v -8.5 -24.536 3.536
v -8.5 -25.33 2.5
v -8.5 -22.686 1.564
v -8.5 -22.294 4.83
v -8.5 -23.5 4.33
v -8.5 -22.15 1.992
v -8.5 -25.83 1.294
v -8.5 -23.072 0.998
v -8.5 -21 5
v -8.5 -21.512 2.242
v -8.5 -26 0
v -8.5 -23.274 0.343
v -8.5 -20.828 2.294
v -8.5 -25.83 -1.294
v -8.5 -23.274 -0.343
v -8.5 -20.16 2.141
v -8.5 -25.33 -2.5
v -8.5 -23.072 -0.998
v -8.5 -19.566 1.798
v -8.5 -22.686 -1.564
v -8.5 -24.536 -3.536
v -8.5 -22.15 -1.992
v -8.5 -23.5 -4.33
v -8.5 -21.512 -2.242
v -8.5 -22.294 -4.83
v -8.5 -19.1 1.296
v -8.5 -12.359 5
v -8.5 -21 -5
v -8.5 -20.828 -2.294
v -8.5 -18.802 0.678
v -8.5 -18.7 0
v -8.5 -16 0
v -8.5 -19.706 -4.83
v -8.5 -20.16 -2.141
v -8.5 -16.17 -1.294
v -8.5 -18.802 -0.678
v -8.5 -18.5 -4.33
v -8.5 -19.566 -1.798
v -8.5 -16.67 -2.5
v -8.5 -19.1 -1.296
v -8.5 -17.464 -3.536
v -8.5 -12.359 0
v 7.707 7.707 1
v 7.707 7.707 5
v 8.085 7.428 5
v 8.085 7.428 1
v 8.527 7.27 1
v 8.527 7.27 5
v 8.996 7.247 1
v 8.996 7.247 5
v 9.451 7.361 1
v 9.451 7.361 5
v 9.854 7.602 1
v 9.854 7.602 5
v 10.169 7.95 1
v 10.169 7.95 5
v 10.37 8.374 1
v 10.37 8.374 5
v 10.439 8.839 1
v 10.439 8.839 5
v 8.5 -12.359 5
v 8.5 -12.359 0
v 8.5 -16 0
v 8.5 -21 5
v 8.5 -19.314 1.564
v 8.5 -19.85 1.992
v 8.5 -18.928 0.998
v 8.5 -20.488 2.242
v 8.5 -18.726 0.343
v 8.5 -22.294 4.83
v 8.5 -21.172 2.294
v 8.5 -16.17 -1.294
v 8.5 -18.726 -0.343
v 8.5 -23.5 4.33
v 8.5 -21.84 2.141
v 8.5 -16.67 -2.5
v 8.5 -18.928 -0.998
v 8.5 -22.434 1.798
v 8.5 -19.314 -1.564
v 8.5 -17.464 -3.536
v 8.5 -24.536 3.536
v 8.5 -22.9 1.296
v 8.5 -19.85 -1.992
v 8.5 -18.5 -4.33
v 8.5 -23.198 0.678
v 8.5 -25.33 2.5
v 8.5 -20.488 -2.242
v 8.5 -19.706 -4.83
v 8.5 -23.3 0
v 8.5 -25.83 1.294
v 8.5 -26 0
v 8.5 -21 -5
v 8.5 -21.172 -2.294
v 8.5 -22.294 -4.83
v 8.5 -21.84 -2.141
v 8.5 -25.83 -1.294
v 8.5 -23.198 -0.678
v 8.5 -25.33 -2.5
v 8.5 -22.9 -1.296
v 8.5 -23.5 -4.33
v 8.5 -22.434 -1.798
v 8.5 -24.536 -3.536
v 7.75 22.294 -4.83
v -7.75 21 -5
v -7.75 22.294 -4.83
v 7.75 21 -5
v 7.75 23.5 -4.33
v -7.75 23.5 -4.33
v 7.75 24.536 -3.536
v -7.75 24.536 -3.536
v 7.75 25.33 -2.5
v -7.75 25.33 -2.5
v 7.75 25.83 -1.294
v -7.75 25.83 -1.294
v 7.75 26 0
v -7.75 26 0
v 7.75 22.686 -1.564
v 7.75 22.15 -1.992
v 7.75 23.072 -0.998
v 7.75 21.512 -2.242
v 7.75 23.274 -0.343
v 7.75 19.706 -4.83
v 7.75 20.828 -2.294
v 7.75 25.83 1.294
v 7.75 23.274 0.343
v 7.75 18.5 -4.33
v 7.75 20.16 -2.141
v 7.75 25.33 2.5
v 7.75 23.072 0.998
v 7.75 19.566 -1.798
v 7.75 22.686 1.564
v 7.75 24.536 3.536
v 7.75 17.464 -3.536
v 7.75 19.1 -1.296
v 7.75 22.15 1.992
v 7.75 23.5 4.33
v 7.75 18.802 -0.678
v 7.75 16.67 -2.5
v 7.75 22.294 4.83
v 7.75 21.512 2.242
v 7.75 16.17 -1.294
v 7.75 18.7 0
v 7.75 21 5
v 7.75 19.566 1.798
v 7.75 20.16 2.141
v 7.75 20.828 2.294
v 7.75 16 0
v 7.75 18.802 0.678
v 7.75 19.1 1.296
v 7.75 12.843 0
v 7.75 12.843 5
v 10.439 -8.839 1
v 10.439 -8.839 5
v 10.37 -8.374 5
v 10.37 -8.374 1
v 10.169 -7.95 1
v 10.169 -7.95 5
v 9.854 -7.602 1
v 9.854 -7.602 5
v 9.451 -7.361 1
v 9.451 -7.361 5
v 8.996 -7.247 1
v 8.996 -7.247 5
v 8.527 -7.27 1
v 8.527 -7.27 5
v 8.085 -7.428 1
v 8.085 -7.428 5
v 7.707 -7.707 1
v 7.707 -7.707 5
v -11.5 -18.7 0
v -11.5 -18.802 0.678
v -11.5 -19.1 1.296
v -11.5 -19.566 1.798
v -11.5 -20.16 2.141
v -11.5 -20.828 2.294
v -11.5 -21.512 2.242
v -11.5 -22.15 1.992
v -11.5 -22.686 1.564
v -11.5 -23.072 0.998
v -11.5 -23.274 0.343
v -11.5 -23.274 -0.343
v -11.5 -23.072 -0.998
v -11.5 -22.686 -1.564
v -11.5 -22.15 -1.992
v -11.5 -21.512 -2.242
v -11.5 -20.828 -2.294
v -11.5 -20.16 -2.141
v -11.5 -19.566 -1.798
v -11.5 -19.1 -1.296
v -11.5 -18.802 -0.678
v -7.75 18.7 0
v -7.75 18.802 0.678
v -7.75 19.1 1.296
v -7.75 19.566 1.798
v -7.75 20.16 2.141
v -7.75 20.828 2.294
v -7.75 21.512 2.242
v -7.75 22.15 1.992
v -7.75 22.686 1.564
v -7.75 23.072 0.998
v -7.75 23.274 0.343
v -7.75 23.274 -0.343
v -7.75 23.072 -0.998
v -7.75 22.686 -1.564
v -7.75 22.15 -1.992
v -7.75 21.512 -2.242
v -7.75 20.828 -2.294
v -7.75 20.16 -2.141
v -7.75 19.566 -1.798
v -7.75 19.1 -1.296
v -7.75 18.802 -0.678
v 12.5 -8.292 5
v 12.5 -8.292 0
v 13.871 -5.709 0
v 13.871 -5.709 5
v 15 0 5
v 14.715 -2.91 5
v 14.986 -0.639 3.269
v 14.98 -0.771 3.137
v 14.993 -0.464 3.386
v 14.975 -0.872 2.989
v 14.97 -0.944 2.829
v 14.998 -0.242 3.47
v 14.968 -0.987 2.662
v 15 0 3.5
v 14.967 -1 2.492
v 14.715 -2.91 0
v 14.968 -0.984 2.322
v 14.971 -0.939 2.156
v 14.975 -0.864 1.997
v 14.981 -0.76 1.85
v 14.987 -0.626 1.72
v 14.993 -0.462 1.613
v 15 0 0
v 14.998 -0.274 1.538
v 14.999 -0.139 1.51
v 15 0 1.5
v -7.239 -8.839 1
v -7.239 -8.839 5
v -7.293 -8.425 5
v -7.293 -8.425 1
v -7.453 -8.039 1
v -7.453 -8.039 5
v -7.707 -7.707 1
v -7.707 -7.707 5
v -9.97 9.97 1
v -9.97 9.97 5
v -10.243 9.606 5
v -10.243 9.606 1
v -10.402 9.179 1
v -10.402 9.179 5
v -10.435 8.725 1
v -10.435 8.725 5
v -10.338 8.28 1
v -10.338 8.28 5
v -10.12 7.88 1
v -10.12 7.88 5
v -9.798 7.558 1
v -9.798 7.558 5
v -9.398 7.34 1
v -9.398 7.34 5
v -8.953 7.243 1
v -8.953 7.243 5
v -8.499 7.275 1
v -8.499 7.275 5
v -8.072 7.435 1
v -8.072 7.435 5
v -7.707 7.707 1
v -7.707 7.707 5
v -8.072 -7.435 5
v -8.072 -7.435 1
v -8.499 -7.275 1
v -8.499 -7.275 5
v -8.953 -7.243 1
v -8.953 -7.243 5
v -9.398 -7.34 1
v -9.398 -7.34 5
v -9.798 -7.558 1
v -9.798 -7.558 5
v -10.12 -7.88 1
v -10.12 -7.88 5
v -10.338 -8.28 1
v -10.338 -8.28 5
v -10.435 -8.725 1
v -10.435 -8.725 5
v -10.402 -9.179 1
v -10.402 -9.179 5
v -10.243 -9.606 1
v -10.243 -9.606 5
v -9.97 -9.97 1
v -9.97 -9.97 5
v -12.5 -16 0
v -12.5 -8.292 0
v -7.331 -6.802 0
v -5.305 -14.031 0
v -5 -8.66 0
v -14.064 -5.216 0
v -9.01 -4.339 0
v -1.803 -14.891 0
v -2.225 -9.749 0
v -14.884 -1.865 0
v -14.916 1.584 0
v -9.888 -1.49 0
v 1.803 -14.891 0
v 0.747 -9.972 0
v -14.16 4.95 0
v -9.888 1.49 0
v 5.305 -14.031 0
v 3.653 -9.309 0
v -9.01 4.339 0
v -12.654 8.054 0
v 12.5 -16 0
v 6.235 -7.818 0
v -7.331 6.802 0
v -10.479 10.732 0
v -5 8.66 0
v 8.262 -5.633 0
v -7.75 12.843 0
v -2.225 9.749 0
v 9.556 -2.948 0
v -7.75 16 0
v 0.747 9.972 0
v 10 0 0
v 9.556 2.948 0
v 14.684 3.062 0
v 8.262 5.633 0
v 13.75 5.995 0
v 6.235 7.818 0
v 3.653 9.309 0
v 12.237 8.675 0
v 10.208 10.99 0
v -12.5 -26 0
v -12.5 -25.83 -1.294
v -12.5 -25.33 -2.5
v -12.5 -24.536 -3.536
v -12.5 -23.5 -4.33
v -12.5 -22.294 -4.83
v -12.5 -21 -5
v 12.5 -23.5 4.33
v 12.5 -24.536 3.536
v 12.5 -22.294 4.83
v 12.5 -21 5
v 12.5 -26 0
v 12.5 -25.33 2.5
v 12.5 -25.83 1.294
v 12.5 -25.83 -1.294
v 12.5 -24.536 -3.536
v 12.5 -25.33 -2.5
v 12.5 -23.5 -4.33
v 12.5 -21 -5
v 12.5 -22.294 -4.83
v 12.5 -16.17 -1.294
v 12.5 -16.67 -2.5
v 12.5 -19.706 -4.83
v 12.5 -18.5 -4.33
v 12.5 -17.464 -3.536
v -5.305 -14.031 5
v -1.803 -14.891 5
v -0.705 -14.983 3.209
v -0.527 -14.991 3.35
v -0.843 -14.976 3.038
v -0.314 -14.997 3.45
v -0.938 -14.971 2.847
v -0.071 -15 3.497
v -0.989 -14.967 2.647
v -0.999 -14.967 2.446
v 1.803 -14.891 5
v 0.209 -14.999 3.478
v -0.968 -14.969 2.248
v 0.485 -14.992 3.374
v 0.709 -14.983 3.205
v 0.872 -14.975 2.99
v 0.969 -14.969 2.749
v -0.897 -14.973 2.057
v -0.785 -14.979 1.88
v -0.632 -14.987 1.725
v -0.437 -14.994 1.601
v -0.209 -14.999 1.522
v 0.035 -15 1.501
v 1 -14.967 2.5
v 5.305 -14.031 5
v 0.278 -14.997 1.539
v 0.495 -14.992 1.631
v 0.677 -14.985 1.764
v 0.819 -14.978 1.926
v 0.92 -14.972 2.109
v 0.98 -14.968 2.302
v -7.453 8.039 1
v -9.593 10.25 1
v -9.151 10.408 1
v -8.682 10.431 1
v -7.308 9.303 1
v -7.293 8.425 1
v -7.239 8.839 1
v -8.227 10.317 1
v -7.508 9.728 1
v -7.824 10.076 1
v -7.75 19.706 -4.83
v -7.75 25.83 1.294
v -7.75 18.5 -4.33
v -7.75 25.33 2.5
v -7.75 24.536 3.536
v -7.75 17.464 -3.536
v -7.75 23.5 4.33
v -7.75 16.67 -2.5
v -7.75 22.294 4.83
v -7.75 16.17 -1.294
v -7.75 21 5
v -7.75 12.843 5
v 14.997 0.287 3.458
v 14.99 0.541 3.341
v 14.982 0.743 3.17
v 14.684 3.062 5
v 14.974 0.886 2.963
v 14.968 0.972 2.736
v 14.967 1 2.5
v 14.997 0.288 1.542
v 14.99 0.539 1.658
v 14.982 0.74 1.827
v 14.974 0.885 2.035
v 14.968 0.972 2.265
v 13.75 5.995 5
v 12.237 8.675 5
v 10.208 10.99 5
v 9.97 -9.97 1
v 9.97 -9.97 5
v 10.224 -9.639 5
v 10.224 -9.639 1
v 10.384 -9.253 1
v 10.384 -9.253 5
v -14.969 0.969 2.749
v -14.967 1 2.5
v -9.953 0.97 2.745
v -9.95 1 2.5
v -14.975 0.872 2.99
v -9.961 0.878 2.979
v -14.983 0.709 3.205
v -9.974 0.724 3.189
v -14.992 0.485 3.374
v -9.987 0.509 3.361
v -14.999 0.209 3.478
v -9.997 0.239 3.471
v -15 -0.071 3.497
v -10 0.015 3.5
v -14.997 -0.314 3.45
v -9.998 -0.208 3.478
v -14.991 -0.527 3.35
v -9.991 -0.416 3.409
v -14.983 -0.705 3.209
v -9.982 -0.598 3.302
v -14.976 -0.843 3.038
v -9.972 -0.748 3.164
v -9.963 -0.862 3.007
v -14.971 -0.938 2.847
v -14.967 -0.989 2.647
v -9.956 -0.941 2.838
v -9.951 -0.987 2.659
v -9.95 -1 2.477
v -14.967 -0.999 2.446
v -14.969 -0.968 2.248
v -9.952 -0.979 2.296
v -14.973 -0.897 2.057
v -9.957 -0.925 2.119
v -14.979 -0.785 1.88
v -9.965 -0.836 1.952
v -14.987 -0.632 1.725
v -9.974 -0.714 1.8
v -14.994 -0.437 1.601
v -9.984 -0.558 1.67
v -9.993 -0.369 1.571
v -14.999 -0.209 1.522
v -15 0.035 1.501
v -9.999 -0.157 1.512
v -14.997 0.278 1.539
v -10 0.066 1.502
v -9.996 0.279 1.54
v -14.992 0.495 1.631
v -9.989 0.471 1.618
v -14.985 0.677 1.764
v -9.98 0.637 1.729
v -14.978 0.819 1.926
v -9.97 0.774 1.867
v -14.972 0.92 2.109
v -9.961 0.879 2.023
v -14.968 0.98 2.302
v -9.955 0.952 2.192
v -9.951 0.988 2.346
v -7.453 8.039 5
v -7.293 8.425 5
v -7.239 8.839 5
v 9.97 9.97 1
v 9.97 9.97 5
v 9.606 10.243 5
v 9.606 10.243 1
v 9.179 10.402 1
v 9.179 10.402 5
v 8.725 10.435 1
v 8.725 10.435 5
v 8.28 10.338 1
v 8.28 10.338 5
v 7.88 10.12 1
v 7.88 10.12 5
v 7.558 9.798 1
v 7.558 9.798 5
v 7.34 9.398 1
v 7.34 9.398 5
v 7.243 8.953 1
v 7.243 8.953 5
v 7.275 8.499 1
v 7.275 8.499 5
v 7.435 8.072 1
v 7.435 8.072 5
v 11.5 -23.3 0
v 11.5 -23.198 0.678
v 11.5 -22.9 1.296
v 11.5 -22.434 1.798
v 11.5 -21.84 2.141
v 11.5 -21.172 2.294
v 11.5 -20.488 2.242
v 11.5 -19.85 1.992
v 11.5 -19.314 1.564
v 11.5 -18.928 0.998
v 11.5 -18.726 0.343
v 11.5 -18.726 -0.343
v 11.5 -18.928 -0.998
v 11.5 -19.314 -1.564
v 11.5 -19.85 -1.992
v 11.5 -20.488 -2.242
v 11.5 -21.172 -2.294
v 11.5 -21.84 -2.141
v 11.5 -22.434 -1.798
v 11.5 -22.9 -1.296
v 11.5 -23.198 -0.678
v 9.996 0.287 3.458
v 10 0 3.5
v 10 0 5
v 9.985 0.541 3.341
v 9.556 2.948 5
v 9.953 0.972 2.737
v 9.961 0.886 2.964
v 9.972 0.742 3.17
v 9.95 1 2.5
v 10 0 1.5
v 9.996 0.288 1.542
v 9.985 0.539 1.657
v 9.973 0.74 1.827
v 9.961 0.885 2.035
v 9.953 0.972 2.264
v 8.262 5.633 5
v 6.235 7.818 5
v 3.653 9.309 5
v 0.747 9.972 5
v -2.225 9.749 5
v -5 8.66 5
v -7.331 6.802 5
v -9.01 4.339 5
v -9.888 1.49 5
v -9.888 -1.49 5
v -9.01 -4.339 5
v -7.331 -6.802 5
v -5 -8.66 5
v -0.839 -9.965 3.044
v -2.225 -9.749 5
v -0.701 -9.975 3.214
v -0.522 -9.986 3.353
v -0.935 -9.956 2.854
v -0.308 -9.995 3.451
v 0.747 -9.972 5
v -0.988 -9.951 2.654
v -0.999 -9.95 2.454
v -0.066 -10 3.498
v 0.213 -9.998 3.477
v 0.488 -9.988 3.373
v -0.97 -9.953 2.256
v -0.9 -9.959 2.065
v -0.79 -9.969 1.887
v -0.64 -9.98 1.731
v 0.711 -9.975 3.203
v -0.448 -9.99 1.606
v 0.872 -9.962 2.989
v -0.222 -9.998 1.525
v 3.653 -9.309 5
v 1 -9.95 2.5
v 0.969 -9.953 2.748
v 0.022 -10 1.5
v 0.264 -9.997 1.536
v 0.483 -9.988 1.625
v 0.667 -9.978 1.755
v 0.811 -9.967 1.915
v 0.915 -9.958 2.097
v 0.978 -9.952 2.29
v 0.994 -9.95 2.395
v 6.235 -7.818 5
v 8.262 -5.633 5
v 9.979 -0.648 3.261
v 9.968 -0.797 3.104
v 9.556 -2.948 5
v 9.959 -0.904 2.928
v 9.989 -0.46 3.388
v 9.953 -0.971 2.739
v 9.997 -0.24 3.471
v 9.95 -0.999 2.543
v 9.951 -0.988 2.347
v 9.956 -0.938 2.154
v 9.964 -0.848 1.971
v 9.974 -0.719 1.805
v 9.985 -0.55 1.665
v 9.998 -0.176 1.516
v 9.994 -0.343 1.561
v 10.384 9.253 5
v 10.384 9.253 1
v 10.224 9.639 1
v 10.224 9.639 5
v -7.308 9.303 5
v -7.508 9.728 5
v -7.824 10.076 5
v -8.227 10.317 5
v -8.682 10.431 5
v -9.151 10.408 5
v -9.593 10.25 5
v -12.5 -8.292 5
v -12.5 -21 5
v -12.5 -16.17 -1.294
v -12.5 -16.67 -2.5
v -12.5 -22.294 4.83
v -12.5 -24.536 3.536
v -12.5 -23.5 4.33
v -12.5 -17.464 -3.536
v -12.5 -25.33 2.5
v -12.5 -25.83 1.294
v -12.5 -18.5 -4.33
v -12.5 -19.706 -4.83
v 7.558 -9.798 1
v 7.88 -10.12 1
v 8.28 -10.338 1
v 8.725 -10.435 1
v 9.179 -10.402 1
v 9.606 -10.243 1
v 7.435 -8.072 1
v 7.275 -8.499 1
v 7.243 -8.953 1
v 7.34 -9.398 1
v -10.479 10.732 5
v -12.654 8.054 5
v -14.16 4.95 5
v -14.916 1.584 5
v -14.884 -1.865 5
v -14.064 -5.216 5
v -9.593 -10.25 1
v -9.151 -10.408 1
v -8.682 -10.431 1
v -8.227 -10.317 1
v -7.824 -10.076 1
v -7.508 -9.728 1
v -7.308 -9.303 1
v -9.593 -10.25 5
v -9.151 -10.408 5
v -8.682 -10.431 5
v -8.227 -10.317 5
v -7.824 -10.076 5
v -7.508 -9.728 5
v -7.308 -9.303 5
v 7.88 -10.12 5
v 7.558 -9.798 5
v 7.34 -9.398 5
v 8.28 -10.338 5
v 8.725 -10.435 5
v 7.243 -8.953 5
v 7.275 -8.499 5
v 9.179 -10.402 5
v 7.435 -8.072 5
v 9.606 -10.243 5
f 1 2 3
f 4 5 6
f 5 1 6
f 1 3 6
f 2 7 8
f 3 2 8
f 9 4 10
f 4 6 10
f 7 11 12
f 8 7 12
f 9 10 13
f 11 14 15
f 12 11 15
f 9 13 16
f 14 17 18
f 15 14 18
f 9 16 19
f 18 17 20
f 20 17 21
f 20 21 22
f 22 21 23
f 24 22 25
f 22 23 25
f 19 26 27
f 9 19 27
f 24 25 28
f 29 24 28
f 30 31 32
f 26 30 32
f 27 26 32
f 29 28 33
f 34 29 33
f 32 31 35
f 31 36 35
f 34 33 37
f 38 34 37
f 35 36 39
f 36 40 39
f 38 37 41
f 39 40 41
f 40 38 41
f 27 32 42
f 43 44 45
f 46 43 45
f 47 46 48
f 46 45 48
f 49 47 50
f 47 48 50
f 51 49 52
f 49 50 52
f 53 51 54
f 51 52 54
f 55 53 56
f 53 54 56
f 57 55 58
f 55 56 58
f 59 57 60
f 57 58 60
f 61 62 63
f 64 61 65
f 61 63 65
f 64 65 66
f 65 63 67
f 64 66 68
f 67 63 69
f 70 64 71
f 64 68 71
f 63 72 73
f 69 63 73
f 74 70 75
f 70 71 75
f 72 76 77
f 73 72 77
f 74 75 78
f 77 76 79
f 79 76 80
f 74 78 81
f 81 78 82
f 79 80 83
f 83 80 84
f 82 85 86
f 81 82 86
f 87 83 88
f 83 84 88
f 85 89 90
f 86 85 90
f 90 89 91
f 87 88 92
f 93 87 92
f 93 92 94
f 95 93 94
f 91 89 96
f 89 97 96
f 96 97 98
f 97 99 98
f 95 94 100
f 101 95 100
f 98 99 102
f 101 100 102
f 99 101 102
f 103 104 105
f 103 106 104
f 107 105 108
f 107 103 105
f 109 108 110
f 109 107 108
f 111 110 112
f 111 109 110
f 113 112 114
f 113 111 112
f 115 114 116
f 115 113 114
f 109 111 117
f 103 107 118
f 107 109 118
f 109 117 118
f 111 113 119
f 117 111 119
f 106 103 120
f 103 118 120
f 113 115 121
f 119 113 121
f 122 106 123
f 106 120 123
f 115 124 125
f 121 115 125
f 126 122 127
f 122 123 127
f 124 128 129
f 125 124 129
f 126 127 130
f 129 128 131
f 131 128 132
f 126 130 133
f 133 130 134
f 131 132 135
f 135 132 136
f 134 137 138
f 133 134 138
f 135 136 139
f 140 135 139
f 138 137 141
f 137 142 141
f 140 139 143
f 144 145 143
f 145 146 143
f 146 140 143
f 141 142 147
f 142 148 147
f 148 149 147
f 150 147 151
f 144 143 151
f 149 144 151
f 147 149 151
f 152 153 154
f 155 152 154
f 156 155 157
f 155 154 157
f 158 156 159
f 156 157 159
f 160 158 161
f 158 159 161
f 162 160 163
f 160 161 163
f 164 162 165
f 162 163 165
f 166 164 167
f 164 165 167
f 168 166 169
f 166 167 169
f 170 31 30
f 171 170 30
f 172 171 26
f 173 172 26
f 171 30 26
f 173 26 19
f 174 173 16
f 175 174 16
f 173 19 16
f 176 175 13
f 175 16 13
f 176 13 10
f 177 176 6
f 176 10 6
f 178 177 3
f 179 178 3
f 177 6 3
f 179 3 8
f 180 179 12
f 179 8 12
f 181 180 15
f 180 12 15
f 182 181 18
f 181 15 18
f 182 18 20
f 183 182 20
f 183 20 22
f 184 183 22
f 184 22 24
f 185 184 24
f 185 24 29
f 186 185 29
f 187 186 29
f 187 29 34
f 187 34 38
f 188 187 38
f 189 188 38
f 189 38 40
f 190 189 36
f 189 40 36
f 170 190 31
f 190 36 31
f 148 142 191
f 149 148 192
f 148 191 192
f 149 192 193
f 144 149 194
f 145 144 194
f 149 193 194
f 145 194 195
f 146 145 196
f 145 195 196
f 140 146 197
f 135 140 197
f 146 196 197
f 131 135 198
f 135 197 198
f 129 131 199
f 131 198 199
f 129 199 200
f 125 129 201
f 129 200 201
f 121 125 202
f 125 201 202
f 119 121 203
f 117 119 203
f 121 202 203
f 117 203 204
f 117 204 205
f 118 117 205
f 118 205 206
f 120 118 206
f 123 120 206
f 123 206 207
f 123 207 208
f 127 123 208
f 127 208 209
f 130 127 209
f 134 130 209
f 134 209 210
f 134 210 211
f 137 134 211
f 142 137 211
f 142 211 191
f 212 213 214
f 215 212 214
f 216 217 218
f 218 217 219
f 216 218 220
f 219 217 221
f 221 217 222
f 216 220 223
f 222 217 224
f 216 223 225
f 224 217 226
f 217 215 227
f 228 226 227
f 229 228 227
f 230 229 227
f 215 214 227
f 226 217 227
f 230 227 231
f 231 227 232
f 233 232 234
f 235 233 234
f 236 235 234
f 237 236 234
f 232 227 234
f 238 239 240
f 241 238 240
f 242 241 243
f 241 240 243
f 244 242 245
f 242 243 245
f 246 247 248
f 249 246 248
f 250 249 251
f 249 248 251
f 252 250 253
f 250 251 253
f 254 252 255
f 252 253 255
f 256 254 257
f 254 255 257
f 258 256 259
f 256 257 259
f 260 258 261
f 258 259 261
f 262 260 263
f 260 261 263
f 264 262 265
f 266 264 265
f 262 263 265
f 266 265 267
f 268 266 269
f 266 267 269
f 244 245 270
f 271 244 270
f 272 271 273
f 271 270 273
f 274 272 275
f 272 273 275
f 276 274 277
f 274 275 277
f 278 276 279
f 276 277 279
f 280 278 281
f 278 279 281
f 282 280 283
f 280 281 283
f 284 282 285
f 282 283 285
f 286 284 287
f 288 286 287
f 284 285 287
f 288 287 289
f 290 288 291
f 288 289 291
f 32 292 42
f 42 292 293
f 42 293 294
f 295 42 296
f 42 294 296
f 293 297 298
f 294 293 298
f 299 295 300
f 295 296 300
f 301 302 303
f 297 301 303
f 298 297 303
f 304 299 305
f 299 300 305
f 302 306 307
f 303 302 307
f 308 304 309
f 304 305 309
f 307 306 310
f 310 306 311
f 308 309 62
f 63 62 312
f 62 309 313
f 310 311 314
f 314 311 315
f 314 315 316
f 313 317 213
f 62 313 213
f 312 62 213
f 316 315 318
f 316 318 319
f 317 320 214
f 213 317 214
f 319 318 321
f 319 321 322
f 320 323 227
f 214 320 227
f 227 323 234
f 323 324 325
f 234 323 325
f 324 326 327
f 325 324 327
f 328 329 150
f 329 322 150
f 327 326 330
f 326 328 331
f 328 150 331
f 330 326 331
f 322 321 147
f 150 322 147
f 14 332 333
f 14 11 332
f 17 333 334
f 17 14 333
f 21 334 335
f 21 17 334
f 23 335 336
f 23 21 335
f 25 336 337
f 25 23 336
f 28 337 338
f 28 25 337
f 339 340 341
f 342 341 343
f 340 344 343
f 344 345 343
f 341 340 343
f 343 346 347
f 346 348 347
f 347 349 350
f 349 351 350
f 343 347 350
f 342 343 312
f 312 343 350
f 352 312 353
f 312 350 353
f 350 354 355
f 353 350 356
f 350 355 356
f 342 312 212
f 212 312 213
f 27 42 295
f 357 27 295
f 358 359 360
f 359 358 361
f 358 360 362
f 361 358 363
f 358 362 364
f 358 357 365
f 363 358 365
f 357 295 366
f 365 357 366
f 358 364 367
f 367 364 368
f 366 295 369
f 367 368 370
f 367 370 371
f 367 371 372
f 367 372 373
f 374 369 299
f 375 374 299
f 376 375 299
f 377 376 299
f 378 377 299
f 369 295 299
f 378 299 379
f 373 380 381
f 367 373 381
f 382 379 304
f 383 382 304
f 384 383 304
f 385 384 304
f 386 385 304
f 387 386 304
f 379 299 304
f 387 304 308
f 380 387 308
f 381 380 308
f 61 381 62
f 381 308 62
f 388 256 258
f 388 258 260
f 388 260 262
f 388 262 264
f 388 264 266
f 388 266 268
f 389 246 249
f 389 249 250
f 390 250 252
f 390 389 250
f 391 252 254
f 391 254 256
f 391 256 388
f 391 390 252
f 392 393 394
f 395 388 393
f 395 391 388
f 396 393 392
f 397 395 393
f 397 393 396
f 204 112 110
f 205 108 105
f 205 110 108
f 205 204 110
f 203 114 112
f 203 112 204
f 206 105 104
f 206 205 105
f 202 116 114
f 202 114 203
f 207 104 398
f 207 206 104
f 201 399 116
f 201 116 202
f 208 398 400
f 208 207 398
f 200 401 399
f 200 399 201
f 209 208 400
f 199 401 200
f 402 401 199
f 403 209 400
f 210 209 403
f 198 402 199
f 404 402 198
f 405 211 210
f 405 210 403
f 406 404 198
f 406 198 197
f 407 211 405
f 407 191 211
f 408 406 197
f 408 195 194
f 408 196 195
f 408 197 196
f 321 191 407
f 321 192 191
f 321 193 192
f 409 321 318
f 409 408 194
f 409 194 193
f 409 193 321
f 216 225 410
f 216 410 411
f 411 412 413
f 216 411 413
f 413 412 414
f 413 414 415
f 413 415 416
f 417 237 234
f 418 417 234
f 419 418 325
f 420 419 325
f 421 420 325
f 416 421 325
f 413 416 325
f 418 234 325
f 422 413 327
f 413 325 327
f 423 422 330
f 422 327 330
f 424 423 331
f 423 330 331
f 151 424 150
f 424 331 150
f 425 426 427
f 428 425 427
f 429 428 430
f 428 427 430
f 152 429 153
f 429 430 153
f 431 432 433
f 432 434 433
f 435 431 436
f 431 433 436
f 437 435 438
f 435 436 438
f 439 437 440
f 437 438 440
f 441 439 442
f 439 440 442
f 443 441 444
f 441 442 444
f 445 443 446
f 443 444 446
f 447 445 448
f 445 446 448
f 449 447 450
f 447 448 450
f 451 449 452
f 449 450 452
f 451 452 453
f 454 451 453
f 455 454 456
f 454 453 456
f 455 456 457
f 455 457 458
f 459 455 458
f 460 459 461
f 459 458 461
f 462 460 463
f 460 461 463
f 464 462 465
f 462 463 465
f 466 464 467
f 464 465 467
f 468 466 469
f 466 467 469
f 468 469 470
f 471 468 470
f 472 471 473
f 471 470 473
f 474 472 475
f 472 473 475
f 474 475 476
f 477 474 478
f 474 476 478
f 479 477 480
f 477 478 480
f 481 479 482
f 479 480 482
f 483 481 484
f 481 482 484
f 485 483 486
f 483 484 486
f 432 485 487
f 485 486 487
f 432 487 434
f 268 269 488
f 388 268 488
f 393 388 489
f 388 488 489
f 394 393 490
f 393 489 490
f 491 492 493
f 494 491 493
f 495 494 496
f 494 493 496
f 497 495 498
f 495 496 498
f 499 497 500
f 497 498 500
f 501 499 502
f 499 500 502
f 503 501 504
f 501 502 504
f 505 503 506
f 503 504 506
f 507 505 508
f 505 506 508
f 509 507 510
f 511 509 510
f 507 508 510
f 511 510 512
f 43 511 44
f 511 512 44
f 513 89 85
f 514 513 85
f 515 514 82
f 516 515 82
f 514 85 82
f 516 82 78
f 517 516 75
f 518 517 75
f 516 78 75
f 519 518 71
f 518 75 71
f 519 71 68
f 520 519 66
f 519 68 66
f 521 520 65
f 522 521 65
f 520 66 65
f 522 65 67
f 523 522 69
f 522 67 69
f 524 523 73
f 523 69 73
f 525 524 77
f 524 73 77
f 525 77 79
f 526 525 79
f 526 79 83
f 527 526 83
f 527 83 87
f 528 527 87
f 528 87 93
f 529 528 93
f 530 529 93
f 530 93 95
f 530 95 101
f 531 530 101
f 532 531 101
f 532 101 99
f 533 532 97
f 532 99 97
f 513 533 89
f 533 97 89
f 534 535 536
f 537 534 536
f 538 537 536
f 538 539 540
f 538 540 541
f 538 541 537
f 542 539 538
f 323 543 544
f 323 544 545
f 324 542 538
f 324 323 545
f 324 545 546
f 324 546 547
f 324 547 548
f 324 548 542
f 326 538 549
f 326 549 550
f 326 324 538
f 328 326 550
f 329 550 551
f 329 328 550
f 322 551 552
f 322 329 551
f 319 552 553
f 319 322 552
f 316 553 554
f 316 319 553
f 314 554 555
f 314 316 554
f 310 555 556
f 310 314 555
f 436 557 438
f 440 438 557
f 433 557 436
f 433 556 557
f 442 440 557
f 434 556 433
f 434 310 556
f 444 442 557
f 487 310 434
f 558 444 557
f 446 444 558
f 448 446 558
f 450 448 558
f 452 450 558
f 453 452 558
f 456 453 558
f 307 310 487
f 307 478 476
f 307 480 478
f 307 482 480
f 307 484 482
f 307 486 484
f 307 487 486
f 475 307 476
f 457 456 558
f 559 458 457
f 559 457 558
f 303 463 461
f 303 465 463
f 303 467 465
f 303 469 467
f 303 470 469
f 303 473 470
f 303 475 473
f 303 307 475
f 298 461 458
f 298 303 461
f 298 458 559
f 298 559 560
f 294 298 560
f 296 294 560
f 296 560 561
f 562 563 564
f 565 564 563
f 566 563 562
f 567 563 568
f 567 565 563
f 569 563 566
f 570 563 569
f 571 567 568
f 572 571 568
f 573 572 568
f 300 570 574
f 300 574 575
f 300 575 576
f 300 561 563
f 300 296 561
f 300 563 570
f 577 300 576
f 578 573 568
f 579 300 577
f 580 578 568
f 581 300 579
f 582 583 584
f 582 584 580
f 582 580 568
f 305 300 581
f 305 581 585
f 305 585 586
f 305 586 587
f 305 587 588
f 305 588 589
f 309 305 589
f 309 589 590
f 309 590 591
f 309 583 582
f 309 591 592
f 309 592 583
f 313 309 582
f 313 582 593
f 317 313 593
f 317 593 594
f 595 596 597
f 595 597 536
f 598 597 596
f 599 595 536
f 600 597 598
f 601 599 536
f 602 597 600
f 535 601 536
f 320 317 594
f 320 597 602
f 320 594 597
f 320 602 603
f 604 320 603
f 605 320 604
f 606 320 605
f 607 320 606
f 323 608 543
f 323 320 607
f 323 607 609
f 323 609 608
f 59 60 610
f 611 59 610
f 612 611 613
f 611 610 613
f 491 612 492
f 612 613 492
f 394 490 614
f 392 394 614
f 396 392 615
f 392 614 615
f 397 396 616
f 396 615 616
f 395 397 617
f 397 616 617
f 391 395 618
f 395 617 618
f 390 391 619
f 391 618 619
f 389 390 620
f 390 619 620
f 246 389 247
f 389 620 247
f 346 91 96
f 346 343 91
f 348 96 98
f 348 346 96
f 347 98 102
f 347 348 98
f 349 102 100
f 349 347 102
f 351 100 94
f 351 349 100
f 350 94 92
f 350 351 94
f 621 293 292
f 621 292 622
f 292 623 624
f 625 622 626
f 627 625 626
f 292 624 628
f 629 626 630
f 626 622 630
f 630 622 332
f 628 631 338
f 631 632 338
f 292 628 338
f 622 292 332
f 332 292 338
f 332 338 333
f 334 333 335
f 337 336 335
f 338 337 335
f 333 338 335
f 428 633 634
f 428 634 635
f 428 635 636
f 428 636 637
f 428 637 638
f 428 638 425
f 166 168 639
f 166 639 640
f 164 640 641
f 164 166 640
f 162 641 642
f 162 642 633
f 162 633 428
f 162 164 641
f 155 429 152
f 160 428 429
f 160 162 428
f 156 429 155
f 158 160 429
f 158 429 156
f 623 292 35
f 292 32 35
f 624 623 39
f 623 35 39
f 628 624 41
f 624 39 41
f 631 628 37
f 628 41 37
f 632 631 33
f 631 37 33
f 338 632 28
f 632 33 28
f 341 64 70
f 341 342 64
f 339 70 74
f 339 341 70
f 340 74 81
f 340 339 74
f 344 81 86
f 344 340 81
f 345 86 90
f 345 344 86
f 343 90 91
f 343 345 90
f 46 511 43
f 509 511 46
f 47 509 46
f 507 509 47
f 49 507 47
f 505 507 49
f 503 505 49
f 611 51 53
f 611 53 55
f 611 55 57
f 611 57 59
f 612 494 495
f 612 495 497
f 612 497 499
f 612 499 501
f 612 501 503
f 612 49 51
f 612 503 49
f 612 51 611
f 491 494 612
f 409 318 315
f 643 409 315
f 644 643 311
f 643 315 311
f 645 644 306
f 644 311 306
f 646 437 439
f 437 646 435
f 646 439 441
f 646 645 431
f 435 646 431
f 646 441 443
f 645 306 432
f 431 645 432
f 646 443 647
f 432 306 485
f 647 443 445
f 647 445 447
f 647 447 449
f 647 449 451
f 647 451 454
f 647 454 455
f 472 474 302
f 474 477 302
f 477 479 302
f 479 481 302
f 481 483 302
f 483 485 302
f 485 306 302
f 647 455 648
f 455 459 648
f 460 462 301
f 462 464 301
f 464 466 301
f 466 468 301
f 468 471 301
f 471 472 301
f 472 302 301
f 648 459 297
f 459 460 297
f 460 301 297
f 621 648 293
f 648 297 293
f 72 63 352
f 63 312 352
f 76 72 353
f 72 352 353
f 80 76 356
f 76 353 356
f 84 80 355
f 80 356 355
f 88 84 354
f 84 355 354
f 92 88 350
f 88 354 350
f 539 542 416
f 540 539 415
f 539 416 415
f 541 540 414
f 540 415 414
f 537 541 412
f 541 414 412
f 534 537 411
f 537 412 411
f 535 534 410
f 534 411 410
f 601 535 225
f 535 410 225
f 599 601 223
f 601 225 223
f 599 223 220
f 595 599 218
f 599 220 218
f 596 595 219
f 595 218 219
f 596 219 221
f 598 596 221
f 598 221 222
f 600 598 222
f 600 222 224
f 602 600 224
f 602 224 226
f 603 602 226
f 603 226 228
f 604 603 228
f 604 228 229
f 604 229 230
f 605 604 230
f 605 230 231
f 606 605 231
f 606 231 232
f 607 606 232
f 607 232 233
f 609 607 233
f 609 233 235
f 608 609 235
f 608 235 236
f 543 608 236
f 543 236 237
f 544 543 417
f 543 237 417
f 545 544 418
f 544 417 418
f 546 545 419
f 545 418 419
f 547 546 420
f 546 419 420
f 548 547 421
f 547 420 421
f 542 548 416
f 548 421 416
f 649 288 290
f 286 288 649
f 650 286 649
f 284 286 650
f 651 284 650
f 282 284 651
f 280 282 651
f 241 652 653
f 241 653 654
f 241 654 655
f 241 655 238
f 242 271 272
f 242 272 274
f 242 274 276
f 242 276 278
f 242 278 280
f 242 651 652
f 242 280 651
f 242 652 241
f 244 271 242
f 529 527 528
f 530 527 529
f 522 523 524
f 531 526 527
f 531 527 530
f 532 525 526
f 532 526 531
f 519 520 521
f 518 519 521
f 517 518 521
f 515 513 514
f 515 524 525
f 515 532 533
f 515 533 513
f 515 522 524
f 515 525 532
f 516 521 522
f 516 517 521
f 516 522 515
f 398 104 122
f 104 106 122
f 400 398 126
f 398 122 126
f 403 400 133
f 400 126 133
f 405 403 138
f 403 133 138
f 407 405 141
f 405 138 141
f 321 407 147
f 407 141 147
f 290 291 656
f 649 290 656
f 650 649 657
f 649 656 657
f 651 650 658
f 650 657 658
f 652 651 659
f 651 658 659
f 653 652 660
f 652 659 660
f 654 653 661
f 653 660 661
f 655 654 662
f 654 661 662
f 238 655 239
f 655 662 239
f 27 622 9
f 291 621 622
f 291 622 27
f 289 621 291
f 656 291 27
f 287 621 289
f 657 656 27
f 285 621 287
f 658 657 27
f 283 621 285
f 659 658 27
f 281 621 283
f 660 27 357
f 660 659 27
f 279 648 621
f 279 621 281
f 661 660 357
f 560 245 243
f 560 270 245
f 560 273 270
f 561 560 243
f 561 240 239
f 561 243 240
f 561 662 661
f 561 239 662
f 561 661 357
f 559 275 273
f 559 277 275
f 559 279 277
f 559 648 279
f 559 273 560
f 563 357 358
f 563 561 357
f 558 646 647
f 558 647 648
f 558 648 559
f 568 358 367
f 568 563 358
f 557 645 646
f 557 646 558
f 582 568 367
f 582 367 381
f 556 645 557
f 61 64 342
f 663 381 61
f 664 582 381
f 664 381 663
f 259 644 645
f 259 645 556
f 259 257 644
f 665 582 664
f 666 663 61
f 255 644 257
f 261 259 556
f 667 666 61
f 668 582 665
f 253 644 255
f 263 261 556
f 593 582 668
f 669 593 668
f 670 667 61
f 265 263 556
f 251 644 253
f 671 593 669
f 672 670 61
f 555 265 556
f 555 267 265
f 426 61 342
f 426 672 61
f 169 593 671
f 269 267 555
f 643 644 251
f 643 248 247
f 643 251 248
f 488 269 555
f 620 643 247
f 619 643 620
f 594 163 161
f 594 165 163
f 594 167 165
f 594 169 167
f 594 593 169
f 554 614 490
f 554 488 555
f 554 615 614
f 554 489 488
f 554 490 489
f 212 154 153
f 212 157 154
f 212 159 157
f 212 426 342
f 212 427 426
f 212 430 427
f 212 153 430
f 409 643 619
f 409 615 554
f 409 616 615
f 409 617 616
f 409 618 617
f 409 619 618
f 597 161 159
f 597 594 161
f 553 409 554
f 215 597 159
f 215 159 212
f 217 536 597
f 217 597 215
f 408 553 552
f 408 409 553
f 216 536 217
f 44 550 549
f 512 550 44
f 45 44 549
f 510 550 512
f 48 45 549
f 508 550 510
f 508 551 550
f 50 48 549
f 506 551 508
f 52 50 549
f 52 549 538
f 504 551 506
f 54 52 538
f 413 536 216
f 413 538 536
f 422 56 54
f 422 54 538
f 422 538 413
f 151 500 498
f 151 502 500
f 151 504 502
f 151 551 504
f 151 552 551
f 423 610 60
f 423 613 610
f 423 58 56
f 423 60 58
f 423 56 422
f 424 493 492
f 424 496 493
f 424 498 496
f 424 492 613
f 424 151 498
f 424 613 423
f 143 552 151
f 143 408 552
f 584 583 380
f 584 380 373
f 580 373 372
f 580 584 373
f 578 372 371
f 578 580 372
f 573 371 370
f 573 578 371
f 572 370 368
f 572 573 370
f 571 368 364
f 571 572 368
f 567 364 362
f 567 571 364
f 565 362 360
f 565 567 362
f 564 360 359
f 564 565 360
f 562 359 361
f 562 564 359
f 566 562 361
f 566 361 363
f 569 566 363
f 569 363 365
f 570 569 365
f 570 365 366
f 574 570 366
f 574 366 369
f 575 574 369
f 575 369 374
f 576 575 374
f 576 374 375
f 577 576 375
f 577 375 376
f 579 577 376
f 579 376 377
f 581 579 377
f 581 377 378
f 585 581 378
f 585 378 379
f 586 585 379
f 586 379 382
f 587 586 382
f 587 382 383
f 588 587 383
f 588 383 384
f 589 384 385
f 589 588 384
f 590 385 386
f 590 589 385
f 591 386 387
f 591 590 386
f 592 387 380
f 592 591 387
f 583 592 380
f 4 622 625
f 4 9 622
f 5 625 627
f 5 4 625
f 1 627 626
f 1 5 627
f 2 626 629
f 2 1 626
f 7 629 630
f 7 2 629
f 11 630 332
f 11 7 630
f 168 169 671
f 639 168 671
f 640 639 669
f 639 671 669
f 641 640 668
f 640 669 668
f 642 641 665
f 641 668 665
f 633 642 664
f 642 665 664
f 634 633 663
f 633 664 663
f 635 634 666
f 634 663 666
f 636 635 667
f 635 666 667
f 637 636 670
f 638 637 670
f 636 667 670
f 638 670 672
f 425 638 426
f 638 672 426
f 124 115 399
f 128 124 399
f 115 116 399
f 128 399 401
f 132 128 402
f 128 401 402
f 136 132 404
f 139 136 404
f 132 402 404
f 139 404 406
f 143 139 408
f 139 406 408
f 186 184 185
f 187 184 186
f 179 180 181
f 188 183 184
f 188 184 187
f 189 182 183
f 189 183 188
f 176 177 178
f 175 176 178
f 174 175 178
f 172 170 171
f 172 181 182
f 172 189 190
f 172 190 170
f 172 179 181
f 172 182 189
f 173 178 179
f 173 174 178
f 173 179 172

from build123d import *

# Parameters (mm, degrees)
F0_R      = 10
F1_DEPTH  = 5
F2_W      = 15.5
F2_H      = 10
F2_W_2    = 4
F3_DEPTH  = 5
F4_R      = 2.3
F5_DEPTH  = 22.751
F7_DEPTH  = 4
F8_R      = 2.3
F9_DEPTH  = 3
F10_R     = 2.3
F11_DEPTH = 3
F12_R     = 4.99999
F13_R     = 1
F14_DEPTH = 25
F15_R     = 1
F16_DEPTH = 25


# Not quite as in the source:
# - a fillet or chamfer is up to 0.001 mm smaller than in the source, because OpenCascade refuses the exact size


with BuildPart() as f1:
    # F0 (on Top) → F1 (new body)
    with BuildSketch(Plane.XY):
        with BuildLine():
            ThreePointArc((7.75, 12.842799539), (0, 15), (-7.75, 12.842799539))
            ThreePointArc((-7.75, 12.842799539), (-14.634921734, 3.289234841), (-12.5, -8.2915619759))
            ThreePointArc((-12.5, -8.2915619759), (-10.6951593818, -10.5172984077), (-8.5, -12.3592070943))
            ThreePointArc((-8.5, -12.3592070943), (0, -15), (8.5, -12.3592070943))
            ThreePointArc((8.5, -12.3592070943), (10.6951593818, -10.5172984077), (12.5, -8.2915619759))
            ThreePointArc((12.5, -8.2915619759), (14.3614066163, -4.3301270189), (15, 0))
            ThreePointArc((15, 0), (13.0623504776, 7.3739406019), (7.75, 12.842799539))
        make_face()
        Circle(F0_R, mode=Mode.SUBTRACT)
        with BuildLine():
            Line((-7.75, 26), (-7.75, 12.842799539))
            ThreePointArc((-7.75, 12.842799539), (0, 15), (7.75, 12.842799539))
            Line((7.75, 12.842799539), (7.75, 26))
            Line((7.75, 26), (-7.75, 26))
        make_face()
        with BuildLine():
            ThreePointArc((-8.5, -12.3592070943), (-10.6951593818, -10.5172984077), (-12.5, -8.2915619759))
            Line((-12.5, -8.2915619759), (-12.5, -26))
            Line((-12.5, -26), (-8.5, -26))
            Line((-8.5, -26), (-8.5, -12.3592070943))
        make_face()
        with BuildLine():
            ThreePointArc((12.5, -8.2915619759), (10.6951593818, -10.5172984077), (8.5, -12.3592070943))
            Line((8.5, -12.3592070943), (8.5, -26))
            Line((8.5, -26), (12.5, -26))
            Line((12.5, -26), (12.5, -8.2915619759))
        make_face()
    extrude(amount=F1_DEPTH)

    # F2 (on face) → F3 (join)
    with BuildSketch(Plane(origin=(0, 0, 0), x_dir=(1, 0, 0), z_dir=(0, 0, -1))):
        with Locations((0, -21)):
            Rectangle(F2_W, F2_H)
        with Locations((-10.5, 21)):
            Rectangle(F2_W_2, F2_H)
        with Locations((10.5, 21)):
            Rectangle(F2_W_2, F2_H)
    extrude(amount=F3_DEPTH)

    # F4 (on face) → F5 (cut, through all)
    with BuildSketch(Plane(origin=(-7.75, 0, 0), x_dir=(0, -1, 0), z_dir=(-1, 0, 0))):
        with Locations((-21, 0)):
            Circle(F4_R)
    extrude(amount=-F5_DEPTH, mode=Mode.SUBTRACT)

    # F6 (on face) → F7 (cut)
    with BuildSketch(Plane.XY.offset(5)):
        with BuildLine():
            ThreePointArc((10.4388347648, -8.8388347648), (9.4511282566, -7.3606275128), (7.7074639149, -7.7074639149))
            Line((7.7074639149, -7.7074639149), (9.9702056147, -9.9702056147))
            ThreePointArc((9.9702056147, -9.9702056147), (10.3170420168, -9.4511282566), (10.4388347648, -8.8388347648))
        make_face()
        with BuildLine():
            Line((9.9702056147, -9.9702056147), (7.7074639149, -7.7074639149))
            ThreePointArc((7.7074639149, -7.7074639149), (7.7074639149, -9.9702056147), (9.9702056147, -9.9702056147))
        make_face()
        with BuildLine():
            ThreePointArc((9.9702056147, 9.9702056147), (7.7074639149, 9.9702056147), (7.7074639149, 7.7074639149))
            Line((7.7074639149, 7.7074639149), (9.9702056147, 9.9702056147))
        make_face()
        with BuildLine():
            Line((9.9702056147, 9.9702056147), (7.7074639149, 7.7074639149))
            ThreePointArc((7.7074639149, 7.7074639149), (9.4511282566, 7.3606275128), (10.4388347648, 8.8388347648))
            ThreePointArc((10.4388347648, 8.8388347648), (10.3170420168, 9.4511282566), (9.9702056147, 9.9702056147))
        make_face()
        with BuildLine():
            ThreePointArc((-9.9702056147, 9.9702056147), (-9.9702056147, 7.7074639149), (-7.7074639149, 7.7074639149))
            Line((-7.7074639149, 7.7074639149), (-9.9702056147, 9.9702056147))
        make_face()
        with BuildLine():
            Line((-9.9702056147, 9.9702056147), (-7.7074639149, 7.7074639149))
            ThreePointArc((-7.7074639149, 7.7074639149), (-7.3606275128, 8.226541273), (-7.2388347648, 8.8388347648))
            ThreePointArc((-7.2388347648, 8.8388347648), (-8.226541273, 10.3170420168), (-9.9702056147, 9.9702056147))
        make_face()
        with BuildLine():
            ThreePointArc((-7.2388347648, -8.8388347648), (-7.3606275128, -8.226541273), (-7.7074639149, -7.7074639149))
            Line((-7.7074639149, -7.7074639149), (-9.9702056147, -9.9702056147))
            ThreePointArc((-9.9702056147, -9.9702056147), (-8.226541273, -10.3170420168), (-7.2388347648, -8.8388347648))
        make_face()
        with BuildLine():
            Line((-9.9702056147, -9.9702056147), (-7.7074639149, -7.7074639149))
            ThreePointArc((-7.7074639149, -7.7074639149), (-9.9702056147, -7.7074639149), (-9.9702056147, -9.9702056147))
        make_face()
    extrude(amount=-F7_DEPTH, mode=Mode.SUBTRACT)

    # F8 (on face) → F9 (cut)
    with BuildSketch(Plane.YZ.offset(-8.5)):
        with Locations((-21, 0)):
            Circle(F8_R)
    extrude(amount=-F9_DEPTH, mode=Mode.SUBTRACT)

    # F10 (on face) → F11 (cut)
    with BuildSketch(Plane(origin=(8.5, 0, 0), x_dir=(0, -1, 0), z_dir=(-1, 0, 0))):
        with Locations((21, 0)):
            Circle(F10_R)
    extrude(amount=-F11_DEPTH, mode=Mode.SUBTRACT)

    # F12 (radius 5 in the source; OpenCascade refuses exactly that, so slightly less here)
    f12_edges = [f1.edges().sort_by_distance(p)[0] for p in [
        (0, 26, -5),
        (0, 16, -5),
        (0, 26, 5),
        (-10.5, -26, -5),
        (-10.5, -26, 5),
        (10.5, -26, 5),
        (10.5, -26, -5),
        (-10.5, -16, -5),
        (10.5, -16, -5),
    ]]
    fillet(f12_edges, radius=F12_R)

    # F13 (on Right) → F14 (cut, symmetric)
    with BuildSketch(Plane.YZ):
        with Locations((0, 2.5)):
            Circle(F13_R)
    extrude(amount=F14_DEPTH, both=True, mode=Mode.SUBTRACT)

    # F15 (on Front) → F16 (cut)
    with BuildSketch(Plane.XZ):
        with Locations((0, 2.5)):
            Circle(F15_R)
    extrude(amount=F16_DEPTH, mode=Mode.SUBTRACT)


solid = f1.part
